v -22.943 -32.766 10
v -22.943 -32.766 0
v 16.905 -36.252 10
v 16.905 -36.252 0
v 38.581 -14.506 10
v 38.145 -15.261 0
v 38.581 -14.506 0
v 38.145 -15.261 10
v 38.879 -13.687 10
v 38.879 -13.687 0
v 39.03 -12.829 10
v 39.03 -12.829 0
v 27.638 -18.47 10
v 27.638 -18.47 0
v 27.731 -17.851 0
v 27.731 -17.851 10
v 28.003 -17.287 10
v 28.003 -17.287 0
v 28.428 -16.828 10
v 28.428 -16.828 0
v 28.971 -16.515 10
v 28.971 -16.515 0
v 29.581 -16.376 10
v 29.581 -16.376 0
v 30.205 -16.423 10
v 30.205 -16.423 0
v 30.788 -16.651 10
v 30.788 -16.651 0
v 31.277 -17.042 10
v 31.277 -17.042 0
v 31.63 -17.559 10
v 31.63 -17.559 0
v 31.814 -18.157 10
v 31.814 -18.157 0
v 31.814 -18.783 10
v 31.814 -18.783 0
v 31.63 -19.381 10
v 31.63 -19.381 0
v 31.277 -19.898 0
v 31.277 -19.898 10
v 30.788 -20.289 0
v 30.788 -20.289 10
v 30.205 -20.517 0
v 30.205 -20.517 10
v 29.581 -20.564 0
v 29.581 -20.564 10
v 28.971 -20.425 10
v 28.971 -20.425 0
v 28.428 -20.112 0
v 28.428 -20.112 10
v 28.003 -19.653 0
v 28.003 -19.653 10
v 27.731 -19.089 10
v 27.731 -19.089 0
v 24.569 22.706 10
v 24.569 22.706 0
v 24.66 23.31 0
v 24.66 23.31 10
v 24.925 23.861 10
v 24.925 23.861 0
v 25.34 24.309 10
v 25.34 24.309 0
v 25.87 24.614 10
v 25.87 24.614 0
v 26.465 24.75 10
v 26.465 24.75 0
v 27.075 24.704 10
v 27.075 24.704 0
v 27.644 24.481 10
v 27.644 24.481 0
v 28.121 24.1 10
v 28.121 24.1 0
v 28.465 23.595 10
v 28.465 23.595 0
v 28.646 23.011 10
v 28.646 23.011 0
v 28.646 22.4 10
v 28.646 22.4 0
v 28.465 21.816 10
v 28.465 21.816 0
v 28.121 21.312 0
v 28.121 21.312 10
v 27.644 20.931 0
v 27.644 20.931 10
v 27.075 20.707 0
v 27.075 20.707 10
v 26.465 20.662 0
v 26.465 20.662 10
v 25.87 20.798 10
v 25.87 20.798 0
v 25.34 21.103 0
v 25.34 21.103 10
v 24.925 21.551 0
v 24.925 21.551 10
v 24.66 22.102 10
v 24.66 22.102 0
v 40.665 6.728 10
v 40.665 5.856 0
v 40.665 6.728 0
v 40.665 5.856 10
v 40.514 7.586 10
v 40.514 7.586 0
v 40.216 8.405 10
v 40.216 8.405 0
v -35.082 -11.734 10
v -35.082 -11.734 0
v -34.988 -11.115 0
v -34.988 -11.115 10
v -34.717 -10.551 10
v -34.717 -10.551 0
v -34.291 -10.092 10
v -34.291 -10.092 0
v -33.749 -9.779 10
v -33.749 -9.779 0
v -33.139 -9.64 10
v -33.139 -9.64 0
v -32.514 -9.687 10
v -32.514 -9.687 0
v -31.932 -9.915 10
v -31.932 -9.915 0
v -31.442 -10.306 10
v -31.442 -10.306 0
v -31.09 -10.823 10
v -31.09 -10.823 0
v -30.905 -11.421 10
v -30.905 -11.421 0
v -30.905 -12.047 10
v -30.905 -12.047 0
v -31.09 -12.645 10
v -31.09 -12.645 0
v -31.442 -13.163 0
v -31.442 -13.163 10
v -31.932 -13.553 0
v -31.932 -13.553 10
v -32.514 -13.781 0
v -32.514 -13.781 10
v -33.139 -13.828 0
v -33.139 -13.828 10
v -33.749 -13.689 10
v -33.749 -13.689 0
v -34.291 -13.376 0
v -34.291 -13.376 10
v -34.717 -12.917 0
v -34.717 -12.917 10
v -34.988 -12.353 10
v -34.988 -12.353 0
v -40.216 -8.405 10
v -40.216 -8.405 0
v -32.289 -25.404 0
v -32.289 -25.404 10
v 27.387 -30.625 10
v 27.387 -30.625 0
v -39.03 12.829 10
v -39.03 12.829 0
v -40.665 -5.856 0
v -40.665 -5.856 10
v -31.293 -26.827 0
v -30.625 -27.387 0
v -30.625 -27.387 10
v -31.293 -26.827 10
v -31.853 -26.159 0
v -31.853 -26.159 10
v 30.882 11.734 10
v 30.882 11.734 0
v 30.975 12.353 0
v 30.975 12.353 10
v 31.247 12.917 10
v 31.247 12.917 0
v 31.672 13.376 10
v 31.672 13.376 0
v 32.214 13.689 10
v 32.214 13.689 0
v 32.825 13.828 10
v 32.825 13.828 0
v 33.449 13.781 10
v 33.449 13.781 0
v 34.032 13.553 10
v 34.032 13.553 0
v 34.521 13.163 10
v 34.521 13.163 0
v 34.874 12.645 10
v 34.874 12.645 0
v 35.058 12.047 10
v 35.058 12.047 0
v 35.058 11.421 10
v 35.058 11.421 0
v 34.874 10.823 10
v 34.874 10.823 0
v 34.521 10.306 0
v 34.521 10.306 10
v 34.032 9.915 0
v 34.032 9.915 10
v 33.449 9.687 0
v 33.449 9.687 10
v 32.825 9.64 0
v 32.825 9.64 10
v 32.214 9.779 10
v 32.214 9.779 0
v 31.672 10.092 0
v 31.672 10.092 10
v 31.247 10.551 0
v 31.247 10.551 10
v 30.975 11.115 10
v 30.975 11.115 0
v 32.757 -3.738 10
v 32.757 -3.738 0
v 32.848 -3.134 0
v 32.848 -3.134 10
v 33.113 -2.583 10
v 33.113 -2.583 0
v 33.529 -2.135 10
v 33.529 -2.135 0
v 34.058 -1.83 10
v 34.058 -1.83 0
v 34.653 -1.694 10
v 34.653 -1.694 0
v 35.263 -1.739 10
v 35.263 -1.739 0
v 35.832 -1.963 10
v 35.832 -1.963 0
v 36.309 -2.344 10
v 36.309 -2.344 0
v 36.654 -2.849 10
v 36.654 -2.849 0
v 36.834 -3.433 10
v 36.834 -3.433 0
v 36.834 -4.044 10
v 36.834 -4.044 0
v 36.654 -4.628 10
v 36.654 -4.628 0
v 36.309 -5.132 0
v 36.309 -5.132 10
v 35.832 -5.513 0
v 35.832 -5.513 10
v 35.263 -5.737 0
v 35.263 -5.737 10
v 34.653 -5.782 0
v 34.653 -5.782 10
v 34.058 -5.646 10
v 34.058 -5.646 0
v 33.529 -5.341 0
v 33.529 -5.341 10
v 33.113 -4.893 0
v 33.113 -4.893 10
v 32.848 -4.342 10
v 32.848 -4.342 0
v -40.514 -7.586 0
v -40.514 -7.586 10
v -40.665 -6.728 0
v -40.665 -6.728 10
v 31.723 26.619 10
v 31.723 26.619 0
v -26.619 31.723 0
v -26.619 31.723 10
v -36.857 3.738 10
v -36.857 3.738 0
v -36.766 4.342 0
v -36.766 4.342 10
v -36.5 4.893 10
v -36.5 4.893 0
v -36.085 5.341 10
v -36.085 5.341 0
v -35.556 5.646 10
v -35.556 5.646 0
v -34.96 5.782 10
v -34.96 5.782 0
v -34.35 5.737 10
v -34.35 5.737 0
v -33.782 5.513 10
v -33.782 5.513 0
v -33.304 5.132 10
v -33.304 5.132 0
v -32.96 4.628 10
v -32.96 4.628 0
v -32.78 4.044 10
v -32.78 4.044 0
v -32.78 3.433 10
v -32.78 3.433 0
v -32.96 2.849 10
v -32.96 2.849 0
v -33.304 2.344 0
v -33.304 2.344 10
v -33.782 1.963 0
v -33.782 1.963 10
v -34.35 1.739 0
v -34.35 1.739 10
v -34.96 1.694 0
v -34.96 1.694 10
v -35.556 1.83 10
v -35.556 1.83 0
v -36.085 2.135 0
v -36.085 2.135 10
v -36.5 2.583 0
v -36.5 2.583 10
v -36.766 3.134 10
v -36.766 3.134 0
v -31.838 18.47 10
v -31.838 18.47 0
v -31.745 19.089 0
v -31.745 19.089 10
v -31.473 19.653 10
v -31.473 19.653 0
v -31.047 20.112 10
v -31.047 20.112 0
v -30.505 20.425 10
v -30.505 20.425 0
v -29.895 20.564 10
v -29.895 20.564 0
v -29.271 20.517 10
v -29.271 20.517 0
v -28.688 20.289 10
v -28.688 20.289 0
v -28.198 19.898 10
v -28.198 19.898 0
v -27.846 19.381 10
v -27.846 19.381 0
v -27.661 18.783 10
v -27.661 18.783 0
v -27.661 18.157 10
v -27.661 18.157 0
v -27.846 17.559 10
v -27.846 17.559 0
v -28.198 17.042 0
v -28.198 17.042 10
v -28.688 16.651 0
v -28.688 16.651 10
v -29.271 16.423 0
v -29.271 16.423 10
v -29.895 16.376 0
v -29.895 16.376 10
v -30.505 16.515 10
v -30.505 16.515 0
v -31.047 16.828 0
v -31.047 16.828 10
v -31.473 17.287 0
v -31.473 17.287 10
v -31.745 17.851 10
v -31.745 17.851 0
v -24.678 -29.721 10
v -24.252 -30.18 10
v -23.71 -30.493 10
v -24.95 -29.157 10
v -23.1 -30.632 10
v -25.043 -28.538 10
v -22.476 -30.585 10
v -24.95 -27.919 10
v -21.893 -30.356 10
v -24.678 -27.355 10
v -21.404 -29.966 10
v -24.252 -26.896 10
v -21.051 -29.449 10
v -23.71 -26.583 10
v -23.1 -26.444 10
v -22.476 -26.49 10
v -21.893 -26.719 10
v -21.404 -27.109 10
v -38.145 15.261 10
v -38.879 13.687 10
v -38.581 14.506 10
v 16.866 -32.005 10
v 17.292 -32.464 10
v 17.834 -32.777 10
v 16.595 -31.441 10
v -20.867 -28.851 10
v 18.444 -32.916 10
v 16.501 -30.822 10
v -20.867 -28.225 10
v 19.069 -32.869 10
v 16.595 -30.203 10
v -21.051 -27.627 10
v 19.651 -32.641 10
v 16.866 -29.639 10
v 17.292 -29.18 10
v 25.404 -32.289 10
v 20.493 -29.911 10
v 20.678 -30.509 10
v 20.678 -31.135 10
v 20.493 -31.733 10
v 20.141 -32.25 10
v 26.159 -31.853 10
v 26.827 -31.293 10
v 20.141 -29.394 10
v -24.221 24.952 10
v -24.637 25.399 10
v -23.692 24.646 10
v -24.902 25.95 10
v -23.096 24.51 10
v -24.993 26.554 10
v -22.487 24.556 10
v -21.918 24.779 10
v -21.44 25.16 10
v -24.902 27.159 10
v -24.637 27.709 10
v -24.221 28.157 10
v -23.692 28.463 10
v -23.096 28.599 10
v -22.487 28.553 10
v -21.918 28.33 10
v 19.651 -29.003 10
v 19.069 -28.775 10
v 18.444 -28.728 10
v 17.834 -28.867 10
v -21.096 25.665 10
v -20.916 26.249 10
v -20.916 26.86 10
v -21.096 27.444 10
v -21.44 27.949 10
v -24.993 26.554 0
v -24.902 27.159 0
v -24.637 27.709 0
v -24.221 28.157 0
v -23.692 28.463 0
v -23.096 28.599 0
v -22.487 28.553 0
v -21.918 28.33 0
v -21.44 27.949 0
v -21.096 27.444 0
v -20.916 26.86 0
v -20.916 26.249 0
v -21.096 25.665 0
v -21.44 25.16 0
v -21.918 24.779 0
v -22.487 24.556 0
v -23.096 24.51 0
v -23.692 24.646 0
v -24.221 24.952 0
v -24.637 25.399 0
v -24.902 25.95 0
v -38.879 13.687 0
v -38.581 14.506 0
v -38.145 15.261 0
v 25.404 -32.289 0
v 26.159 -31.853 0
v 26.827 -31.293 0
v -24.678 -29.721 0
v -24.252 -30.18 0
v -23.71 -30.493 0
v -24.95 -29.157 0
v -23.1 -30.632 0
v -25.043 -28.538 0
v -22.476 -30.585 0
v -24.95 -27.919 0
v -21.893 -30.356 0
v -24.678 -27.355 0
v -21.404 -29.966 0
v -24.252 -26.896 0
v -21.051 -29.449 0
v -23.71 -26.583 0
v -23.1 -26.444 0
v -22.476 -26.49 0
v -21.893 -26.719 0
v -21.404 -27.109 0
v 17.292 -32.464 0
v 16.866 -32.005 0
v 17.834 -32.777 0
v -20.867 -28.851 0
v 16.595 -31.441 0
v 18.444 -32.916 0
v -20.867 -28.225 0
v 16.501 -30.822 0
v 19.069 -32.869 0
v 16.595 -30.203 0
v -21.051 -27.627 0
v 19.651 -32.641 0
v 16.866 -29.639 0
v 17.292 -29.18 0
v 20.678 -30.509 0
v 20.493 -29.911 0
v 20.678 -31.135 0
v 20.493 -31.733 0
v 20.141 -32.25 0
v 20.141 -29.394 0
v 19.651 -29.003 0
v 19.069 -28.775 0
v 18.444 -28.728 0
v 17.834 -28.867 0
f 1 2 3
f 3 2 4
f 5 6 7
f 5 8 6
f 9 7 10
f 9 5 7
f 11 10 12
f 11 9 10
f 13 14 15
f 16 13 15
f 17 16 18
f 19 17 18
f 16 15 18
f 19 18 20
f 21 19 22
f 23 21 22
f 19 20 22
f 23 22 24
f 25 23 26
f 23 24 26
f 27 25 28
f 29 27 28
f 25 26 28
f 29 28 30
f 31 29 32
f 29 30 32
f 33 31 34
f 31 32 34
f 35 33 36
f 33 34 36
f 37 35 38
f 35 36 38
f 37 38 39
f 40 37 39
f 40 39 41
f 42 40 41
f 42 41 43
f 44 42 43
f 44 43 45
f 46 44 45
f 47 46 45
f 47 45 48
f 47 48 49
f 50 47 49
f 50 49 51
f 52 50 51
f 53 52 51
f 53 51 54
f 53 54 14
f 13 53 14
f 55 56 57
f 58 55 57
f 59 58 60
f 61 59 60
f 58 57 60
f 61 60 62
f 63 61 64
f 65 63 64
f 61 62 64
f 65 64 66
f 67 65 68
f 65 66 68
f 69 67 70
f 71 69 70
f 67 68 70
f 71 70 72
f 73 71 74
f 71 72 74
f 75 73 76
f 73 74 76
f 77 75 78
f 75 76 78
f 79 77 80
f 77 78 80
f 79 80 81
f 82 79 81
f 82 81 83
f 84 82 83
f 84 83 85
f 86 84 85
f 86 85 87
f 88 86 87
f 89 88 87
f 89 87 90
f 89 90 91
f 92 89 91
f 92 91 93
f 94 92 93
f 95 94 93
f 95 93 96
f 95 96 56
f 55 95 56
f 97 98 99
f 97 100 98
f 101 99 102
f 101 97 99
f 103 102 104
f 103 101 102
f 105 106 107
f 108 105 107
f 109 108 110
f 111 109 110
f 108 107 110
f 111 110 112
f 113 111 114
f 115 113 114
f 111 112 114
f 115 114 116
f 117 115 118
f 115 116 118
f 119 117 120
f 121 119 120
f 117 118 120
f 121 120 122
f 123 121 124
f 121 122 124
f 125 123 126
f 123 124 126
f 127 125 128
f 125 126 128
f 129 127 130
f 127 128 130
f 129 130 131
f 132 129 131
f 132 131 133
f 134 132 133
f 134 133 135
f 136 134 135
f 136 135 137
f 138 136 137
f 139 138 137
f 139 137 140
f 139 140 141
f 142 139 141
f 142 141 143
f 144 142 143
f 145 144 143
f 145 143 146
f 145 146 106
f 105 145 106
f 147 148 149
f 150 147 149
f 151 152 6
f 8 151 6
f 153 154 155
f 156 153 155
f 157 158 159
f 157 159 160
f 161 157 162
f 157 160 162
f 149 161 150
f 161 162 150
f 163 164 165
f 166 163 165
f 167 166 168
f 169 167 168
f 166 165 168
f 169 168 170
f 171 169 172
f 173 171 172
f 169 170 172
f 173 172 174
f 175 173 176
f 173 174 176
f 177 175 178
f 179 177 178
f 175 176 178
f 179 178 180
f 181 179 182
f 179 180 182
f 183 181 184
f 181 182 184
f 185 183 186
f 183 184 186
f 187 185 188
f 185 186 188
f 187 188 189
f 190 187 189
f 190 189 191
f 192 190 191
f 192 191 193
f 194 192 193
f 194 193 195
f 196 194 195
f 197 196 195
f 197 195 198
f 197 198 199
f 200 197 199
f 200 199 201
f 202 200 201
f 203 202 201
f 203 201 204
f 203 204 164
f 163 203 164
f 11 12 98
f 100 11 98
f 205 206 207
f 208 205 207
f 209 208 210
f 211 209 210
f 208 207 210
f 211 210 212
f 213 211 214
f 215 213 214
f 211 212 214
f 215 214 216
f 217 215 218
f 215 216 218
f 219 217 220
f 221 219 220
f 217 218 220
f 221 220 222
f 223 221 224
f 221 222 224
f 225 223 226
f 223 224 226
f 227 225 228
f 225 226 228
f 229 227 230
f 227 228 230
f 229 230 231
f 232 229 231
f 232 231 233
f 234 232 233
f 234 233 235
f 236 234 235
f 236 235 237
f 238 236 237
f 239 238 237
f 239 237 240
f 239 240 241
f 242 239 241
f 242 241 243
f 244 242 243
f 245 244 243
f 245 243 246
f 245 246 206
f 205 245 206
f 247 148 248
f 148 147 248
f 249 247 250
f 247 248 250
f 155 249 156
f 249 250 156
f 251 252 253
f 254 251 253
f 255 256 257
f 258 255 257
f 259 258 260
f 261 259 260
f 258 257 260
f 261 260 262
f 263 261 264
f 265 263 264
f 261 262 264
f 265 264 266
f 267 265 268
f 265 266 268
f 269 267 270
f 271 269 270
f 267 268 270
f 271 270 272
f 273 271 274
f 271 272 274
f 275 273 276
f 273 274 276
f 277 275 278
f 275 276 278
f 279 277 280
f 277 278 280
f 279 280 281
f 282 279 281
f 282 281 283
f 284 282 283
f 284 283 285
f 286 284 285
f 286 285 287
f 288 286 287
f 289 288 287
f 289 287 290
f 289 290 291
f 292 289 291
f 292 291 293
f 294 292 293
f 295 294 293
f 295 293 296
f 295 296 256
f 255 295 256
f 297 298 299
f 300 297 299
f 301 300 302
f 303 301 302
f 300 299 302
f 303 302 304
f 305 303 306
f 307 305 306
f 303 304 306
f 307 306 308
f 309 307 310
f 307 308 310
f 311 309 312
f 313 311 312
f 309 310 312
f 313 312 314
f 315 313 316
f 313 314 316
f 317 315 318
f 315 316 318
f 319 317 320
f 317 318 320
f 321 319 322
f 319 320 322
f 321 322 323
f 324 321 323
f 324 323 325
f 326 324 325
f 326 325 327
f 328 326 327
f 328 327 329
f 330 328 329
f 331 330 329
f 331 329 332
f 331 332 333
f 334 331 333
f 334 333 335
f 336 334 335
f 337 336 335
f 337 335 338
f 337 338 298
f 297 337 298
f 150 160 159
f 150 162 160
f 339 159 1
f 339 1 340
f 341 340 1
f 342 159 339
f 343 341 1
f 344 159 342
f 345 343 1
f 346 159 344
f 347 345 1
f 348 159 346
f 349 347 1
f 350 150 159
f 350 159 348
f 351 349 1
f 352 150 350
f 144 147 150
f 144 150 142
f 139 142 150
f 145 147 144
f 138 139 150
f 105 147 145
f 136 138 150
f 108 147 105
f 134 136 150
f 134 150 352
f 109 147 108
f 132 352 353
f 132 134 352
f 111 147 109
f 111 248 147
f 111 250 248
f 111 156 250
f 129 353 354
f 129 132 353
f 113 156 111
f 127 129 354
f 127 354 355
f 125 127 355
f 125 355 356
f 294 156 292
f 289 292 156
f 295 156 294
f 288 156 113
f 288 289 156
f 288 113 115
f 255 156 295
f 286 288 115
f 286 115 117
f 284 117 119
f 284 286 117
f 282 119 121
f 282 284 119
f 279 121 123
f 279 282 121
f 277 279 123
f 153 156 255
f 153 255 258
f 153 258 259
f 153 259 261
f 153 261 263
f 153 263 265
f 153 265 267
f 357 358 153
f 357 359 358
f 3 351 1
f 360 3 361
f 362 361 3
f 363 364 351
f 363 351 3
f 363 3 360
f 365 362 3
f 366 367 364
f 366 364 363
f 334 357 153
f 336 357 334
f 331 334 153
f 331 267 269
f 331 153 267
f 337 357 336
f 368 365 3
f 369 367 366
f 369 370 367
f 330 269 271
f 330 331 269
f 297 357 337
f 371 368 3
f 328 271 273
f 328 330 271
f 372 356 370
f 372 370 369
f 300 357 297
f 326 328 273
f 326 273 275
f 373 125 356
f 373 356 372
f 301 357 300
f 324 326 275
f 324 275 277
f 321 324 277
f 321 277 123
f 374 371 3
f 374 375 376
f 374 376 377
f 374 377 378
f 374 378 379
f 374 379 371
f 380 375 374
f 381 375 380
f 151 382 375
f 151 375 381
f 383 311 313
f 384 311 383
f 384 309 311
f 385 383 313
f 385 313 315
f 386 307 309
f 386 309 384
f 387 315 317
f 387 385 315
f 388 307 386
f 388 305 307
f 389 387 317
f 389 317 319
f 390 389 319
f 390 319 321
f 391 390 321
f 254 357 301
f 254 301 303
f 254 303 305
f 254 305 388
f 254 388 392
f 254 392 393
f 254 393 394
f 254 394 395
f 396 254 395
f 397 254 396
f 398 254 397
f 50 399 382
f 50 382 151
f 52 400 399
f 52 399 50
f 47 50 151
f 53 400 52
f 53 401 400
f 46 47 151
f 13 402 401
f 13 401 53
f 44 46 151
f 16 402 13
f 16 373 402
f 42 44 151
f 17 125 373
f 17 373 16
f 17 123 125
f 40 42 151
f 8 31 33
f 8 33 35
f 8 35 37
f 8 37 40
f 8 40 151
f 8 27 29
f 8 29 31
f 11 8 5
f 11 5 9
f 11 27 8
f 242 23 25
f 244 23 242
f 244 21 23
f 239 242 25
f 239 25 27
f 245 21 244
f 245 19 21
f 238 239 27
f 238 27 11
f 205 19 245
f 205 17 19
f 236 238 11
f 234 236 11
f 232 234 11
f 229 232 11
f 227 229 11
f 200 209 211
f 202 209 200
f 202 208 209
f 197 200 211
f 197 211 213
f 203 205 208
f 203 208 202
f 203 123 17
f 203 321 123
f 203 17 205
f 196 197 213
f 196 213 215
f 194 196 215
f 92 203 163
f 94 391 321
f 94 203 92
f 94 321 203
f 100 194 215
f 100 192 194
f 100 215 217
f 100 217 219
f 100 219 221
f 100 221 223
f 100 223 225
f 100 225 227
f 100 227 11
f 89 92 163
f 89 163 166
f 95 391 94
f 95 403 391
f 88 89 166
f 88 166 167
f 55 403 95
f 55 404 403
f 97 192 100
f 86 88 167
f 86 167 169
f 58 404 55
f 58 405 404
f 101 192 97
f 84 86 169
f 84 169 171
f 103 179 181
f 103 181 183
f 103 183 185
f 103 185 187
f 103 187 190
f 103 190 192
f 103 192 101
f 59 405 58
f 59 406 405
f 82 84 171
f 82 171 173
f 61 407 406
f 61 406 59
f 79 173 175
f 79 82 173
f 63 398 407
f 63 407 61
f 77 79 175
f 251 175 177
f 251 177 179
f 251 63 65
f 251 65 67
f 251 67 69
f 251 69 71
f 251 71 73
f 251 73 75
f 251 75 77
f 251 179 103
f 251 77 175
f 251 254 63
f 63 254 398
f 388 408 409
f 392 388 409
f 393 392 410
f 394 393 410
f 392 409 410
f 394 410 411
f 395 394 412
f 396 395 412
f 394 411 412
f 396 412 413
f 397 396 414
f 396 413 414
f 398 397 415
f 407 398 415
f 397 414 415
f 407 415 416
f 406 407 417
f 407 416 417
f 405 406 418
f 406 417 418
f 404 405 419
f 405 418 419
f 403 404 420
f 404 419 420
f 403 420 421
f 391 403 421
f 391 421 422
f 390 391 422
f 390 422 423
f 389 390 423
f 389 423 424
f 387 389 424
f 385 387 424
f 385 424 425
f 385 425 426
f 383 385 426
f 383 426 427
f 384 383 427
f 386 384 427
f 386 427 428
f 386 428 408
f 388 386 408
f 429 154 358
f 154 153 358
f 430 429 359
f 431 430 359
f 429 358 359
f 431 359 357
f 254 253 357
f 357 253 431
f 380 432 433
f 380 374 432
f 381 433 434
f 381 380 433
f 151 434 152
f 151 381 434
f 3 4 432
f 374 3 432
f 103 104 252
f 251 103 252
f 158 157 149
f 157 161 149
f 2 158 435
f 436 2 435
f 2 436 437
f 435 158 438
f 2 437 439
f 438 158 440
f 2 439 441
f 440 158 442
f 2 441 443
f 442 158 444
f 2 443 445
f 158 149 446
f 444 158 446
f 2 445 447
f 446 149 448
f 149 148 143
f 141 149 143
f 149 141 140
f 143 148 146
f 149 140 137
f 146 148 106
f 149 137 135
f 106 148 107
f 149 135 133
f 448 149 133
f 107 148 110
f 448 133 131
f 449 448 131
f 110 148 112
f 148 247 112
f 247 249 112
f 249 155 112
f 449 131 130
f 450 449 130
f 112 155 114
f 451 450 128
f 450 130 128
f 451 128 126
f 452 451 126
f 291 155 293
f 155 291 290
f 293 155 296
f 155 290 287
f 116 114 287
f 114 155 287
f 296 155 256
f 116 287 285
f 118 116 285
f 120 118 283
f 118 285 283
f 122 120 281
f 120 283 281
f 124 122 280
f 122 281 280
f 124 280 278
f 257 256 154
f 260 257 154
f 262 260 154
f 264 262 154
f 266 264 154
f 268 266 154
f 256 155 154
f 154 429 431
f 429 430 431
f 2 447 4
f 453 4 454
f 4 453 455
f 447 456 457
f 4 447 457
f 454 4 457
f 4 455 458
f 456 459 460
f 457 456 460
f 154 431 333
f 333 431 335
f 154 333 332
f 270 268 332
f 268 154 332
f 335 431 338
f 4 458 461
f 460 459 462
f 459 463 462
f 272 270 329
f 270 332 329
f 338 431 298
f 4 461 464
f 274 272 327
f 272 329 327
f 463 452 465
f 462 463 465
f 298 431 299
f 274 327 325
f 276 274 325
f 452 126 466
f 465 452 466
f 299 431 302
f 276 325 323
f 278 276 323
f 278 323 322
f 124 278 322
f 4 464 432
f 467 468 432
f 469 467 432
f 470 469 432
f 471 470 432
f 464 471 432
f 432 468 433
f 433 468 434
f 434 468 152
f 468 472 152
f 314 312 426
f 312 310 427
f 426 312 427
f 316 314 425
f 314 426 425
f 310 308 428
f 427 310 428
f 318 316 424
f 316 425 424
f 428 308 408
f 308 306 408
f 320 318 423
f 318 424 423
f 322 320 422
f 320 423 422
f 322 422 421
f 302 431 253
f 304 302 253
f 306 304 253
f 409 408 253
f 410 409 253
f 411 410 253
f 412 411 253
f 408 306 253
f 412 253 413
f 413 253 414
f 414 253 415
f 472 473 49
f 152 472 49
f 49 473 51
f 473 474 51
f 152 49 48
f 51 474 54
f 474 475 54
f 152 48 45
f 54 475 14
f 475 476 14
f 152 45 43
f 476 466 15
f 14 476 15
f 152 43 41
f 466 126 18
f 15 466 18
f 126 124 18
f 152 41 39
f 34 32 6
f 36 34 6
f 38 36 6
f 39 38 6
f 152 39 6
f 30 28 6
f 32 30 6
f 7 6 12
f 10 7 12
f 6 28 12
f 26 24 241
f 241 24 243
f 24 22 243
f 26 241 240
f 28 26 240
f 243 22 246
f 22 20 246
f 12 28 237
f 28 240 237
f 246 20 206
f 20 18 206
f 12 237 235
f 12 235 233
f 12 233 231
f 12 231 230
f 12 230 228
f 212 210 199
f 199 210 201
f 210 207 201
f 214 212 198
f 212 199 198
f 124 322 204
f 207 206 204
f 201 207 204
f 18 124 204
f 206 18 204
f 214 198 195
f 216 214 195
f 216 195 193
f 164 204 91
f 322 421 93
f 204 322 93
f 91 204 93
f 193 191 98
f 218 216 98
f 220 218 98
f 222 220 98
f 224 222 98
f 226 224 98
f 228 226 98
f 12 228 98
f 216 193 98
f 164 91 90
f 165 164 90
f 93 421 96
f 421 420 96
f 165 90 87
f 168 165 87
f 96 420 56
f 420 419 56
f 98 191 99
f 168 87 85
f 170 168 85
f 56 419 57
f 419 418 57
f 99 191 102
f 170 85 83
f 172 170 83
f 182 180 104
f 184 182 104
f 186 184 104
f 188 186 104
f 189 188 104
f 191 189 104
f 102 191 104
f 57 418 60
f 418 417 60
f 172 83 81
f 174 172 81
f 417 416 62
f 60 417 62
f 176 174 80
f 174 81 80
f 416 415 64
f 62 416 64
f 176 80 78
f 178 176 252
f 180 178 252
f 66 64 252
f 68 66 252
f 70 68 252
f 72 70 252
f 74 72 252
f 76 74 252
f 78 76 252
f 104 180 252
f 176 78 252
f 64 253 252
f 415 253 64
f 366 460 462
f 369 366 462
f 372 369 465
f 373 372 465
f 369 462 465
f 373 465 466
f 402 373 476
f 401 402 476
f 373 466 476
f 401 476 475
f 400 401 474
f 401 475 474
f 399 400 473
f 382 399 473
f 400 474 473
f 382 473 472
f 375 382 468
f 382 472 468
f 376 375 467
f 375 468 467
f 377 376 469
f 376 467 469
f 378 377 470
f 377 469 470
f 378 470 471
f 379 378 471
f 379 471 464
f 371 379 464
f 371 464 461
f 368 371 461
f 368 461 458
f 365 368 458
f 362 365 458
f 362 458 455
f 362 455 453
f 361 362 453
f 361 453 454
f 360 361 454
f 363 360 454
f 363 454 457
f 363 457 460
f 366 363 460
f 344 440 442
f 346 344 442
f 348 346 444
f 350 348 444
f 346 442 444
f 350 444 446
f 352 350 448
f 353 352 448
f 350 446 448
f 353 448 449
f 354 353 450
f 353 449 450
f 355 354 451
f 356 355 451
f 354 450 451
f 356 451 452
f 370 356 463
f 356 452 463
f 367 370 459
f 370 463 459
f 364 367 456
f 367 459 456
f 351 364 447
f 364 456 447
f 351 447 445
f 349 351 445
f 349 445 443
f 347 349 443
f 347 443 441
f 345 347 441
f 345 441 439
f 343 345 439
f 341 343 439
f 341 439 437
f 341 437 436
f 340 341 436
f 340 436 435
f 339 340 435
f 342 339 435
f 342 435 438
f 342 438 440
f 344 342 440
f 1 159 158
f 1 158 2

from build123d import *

# Parameters (mm, degrees)
BOSS_EXTRU_1_DEPTH      = 10
ESQUISSE3_R             = 2.05
ESQUISSE3_R_2           = 2.1
ENL_V_MAT_EXTRU_1_DEPTH = 56.474274361
CONG_1_R                = 5


with BuildPart() as part:
    # Esquisse1 → Boss.-Extru.1 (new body)
    with BuildSketch(Plane.XY):
        Polygon((16.90473047, -36.252311481), (26.618508055, -31.722702604), (38.913655488, -14.163412304), (40.781920359, 7.190952884), (31.722702604, 26.618508055), (-26.618508055, 31.722702604), (-38.913655488, 14.163412304), (-40.781920359, -7.190952884), (-31.722702604, -26.618508055), (-22.943057454, -32.766081772), align=None)
    extrude(amount=BOSS_EXTRU_1_DEPTH)

    # Esquisse3 → Enlèv. mat.-Extru.1 (cut, through all)
    with BuildSketch(Plane(origin=(0, 0, 0), x_dir=(-1, 0, 0), z_dir=(0, 0, -1))):
        with Locations((-26.618508055, 22.705871893)):
            Circle(ESQUISSE3_R)
        with Locations((22.943057454, 26.554275329)):
            Circle(ESQUISSE3_R)
        with Locations((29.737818366, 18.469938184)):
            Circle(ESQUISSE3_R_2)
        with Locations((34.806654387, 3.73808347)):
            Circle(ESQUISSE3_R)
        with Locations((32.981605632, -11.73414452)):
            Circle(ESQUISSE3_R_2)
        with Locations((22.943057454, -28.537832938)):
            Circle(ESQUISSE3_R_2)
        with Locations((-18.601253659, -30.822032576)):
            Circle(ESQUISSE3_R_2)
        with Locations((-29.737818366, -18.469938184)):
            Circle(ESQUISSE3_R_2)
        with Locations((-34.806654387, -3.73808347)):
            Circle(ESQUISSE3_R)
        with Locations((-32.981605632, 11.73414452)):
            Circle(ESQUISSE3_R_2)
    extrude(amount=-ENL_V_MAT_EXTRU_1_DEPTH, mode=Mode.SUBTRACT)

    # Congé1
    cong_1_edges = [part.edges().sort_by_distance(p)[0] for p in [
        (40.781920359, 7.190952884, 5),
        (38.913655488, -14.163412304, 5),
        (26.618508055, -31.722702604, 5),
        (-31.722702604, -26.618508055, 5),
        (-40.781920359, -7.190952884, 5),
        (-38.913655488, 14.163412304, 5),
    ]]
    fillet(cong_1_edges, radius=CONG_1_R)


solid = part.part
